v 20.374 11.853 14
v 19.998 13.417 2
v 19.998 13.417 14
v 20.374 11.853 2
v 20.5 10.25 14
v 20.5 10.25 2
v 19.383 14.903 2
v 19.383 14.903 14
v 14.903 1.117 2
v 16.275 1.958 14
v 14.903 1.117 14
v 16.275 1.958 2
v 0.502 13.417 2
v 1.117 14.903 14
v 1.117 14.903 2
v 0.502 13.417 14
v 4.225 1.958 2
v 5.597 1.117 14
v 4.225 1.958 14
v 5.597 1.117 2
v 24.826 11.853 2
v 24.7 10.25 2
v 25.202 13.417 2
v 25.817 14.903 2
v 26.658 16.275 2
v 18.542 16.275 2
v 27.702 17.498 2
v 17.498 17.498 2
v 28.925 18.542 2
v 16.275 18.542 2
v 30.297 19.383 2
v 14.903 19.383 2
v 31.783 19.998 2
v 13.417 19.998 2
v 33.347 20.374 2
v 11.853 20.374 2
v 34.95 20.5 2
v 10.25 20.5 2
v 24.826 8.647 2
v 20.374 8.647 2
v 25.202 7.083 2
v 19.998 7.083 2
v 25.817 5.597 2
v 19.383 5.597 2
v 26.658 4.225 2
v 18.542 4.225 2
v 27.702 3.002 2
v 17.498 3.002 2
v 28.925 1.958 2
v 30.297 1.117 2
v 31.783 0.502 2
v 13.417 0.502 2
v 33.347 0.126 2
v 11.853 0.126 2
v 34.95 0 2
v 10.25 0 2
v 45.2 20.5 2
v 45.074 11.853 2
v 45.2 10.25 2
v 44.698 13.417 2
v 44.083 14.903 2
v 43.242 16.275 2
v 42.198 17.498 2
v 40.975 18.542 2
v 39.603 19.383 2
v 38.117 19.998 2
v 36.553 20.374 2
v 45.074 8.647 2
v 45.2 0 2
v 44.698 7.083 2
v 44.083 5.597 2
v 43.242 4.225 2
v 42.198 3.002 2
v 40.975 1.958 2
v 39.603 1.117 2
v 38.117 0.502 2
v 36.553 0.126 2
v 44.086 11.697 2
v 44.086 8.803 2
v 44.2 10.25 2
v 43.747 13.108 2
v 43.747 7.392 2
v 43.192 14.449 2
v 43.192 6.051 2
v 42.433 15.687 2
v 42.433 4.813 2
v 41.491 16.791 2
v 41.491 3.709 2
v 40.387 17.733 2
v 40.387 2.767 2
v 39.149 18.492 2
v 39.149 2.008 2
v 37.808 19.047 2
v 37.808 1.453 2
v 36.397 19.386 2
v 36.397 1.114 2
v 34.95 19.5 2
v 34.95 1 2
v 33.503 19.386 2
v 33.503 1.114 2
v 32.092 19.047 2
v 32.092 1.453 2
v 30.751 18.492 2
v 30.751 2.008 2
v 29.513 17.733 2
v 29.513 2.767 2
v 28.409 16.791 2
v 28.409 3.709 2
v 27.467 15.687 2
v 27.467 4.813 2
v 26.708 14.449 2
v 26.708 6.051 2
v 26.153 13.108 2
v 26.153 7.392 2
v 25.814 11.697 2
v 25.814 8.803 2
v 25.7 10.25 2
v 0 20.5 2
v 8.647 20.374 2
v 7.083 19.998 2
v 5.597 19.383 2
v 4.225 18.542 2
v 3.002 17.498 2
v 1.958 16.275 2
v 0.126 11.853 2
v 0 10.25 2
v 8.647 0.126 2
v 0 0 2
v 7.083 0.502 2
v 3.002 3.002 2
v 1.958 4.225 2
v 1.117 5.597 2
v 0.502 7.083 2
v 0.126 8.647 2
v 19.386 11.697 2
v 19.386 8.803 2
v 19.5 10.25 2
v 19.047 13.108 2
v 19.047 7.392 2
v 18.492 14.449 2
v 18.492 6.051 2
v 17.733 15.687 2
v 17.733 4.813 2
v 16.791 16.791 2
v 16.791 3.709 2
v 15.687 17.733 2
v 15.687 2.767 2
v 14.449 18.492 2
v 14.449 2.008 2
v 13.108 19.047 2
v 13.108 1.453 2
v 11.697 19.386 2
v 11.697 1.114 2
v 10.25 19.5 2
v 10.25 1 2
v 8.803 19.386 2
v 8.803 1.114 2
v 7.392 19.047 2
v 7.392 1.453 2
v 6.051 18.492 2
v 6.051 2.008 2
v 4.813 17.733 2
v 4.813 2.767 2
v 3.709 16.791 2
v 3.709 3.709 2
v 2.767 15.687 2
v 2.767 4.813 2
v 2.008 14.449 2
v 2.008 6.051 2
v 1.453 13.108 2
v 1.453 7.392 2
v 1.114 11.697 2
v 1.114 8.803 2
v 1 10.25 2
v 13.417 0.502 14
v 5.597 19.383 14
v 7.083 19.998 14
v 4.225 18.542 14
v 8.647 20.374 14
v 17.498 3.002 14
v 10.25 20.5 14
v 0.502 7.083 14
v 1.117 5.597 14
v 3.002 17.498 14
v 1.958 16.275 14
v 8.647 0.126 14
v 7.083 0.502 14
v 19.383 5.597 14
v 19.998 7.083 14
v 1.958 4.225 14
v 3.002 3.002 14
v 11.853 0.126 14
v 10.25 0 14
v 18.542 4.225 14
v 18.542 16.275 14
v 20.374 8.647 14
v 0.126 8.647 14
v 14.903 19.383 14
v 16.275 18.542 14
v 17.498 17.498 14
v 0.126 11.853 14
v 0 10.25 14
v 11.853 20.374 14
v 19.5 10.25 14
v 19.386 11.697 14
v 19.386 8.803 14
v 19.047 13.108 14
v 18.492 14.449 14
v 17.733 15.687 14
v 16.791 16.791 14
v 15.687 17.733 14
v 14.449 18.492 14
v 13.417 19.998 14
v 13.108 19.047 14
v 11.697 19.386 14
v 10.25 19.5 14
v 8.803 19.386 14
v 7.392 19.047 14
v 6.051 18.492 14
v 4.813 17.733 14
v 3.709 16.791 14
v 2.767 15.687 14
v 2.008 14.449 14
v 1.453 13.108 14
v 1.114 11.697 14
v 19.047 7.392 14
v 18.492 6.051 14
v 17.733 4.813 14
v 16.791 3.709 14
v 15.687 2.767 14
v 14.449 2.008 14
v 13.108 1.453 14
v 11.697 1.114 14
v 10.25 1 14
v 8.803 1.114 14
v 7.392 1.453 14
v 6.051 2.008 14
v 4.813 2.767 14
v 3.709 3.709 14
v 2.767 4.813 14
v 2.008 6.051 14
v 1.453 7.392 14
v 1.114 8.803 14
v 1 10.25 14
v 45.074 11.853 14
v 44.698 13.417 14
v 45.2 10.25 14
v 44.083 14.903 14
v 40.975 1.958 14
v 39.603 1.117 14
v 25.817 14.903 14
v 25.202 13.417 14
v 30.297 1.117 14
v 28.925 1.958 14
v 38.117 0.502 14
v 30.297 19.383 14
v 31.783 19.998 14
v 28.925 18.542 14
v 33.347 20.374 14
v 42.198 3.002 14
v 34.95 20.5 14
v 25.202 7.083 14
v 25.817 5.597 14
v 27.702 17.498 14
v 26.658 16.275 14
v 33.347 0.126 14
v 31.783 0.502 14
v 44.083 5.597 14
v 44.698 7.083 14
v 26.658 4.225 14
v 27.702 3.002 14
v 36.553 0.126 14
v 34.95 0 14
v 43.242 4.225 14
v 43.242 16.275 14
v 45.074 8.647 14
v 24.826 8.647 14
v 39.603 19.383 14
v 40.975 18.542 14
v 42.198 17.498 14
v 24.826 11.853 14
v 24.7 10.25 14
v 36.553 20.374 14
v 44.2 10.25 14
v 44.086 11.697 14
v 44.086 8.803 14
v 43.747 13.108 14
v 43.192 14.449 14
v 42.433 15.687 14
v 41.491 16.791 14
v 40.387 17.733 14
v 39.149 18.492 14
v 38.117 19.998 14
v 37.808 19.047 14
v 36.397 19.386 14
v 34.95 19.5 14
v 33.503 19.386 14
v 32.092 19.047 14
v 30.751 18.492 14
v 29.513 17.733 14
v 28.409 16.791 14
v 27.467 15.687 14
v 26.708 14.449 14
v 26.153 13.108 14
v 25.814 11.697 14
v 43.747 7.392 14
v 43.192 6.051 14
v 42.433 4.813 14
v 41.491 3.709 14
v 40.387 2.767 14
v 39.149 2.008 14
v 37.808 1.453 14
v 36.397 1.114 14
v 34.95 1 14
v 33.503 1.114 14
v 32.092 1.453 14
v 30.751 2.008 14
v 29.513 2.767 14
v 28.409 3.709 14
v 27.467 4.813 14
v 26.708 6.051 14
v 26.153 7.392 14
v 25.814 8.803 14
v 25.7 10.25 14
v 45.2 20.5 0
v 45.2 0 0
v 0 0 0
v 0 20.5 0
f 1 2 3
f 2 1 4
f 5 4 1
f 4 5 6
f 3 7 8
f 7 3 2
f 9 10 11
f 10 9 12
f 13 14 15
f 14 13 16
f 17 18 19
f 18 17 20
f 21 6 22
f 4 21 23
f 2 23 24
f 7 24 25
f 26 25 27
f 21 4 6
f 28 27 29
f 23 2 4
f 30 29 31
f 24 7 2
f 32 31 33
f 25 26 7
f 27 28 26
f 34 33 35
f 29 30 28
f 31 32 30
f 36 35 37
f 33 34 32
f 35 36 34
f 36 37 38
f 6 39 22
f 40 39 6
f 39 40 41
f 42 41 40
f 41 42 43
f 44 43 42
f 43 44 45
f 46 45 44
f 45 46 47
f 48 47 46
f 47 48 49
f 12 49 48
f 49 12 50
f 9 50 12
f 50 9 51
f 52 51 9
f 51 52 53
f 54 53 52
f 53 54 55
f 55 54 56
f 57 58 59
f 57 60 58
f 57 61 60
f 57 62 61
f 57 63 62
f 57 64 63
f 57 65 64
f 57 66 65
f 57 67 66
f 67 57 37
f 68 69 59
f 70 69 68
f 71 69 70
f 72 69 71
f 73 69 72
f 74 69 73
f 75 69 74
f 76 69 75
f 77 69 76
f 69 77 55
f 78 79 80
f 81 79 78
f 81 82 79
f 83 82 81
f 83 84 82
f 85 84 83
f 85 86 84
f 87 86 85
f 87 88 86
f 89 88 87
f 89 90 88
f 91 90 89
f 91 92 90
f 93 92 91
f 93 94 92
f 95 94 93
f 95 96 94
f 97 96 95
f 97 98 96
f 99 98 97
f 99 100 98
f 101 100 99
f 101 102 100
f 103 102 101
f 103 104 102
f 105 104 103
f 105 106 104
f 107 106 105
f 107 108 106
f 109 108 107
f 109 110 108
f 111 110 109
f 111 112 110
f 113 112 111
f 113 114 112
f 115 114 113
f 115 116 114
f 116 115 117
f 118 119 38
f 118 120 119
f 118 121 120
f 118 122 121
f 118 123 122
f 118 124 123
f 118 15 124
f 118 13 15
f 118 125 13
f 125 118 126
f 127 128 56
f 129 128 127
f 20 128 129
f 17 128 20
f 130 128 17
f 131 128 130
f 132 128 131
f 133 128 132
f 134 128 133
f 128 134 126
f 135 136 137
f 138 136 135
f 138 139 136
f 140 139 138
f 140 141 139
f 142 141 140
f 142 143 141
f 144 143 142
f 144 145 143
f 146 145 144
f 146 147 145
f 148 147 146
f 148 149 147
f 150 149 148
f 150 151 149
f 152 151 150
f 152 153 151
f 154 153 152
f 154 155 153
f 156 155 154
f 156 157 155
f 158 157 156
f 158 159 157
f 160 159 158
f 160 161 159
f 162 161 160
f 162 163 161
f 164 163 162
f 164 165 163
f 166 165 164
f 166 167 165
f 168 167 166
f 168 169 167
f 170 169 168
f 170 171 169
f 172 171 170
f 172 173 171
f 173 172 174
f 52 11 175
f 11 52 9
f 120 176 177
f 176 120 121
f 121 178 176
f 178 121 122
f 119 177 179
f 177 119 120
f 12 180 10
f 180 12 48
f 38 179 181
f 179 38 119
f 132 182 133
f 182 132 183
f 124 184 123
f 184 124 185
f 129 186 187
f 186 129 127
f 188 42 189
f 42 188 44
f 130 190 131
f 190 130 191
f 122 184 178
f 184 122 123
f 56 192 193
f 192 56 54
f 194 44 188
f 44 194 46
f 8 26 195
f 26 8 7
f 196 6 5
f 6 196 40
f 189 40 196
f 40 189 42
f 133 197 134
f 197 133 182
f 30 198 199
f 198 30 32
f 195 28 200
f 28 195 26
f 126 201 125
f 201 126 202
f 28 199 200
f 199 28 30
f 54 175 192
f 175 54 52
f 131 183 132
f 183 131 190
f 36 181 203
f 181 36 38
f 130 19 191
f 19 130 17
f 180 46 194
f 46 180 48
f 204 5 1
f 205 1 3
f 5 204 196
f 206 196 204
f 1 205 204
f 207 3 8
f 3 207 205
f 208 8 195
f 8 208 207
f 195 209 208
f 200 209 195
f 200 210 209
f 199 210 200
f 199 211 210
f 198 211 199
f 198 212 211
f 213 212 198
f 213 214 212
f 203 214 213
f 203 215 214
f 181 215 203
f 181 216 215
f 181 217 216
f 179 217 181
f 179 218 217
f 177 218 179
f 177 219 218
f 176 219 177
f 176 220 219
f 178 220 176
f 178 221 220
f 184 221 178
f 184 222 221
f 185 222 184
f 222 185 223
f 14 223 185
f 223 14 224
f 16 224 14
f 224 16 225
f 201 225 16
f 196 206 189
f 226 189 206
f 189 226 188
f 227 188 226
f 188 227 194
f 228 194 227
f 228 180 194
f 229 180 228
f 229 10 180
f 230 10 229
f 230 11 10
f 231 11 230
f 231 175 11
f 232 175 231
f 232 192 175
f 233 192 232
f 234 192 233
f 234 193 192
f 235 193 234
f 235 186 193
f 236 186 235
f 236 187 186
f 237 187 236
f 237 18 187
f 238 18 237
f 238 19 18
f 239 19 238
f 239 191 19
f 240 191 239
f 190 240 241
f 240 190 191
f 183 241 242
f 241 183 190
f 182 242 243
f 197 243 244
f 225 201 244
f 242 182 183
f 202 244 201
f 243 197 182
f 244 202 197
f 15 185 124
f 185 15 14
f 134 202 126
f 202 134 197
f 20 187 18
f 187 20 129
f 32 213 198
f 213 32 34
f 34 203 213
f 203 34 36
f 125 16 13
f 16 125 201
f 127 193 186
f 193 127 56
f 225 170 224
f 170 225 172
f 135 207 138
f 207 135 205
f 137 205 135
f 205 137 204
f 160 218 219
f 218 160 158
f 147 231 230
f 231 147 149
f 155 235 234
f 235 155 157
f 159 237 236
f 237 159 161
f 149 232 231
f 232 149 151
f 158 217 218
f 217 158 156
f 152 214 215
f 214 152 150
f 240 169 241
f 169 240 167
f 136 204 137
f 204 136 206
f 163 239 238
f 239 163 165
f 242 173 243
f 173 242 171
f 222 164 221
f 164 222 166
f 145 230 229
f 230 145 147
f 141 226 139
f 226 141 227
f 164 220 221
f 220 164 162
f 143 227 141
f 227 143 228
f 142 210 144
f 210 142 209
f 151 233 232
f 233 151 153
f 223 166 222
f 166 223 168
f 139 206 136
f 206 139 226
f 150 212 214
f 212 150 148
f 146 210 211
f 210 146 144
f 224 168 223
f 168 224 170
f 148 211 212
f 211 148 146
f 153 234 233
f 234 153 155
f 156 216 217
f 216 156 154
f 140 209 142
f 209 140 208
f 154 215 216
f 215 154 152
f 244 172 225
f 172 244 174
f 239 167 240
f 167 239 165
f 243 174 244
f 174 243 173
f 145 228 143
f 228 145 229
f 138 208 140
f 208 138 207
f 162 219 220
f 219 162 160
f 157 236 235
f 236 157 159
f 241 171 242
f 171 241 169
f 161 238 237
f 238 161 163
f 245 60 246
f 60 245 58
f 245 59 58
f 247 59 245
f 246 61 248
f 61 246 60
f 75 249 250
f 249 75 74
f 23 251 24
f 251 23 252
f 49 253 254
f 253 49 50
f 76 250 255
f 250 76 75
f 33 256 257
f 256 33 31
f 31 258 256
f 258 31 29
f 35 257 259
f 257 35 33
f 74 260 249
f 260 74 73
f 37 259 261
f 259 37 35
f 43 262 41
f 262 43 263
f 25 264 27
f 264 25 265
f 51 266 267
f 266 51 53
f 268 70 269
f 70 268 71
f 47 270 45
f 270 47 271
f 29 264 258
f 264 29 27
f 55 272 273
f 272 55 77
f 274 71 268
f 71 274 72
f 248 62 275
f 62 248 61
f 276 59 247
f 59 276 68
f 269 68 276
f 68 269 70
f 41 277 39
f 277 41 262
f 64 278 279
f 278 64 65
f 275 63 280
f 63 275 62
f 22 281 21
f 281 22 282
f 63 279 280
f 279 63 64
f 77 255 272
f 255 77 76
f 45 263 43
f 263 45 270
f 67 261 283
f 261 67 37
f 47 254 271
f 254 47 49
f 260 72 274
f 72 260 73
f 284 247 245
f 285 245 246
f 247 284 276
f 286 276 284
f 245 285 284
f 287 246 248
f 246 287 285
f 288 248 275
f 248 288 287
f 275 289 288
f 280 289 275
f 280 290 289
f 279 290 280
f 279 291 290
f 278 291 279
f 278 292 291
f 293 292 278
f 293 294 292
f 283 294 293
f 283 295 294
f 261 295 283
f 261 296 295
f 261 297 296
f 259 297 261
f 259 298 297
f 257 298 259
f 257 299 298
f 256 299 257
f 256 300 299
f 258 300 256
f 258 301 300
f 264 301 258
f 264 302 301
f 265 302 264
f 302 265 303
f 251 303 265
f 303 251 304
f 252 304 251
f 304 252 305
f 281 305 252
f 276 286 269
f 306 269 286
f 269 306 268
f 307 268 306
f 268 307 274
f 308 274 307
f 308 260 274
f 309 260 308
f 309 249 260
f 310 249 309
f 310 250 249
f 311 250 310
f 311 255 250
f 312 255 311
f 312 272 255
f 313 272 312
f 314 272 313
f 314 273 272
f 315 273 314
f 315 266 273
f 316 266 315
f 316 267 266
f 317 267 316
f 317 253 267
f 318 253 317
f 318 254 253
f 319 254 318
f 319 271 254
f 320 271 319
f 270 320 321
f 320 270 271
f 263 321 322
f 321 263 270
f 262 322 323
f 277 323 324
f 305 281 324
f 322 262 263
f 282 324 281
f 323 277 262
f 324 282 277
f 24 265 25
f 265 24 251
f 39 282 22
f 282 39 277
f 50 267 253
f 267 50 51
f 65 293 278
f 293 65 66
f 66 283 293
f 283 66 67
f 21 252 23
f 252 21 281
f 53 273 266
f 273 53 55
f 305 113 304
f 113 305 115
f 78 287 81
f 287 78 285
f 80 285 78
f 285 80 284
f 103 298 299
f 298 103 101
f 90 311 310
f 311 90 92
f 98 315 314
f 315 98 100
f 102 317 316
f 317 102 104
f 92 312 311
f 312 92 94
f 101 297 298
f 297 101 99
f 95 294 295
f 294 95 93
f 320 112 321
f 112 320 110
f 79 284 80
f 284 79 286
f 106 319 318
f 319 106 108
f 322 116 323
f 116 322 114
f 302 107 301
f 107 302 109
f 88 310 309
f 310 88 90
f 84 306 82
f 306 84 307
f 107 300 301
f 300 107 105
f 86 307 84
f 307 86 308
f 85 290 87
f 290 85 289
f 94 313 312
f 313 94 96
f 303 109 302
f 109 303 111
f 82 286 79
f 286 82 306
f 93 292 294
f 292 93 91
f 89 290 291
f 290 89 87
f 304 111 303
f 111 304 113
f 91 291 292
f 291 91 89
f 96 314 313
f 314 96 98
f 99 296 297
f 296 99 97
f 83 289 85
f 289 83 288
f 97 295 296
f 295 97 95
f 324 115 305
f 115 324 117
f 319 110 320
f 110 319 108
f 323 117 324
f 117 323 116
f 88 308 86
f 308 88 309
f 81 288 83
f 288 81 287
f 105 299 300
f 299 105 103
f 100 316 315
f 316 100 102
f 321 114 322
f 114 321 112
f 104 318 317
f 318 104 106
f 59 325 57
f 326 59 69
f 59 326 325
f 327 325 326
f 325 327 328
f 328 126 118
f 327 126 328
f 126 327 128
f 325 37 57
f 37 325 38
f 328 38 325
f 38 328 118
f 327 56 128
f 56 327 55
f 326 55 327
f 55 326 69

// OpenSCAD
// file: tolerance.scad
// Author: Mihai Oltean, https://mihaioltean.github.io, mihai.oltean@gmail.com
// More details: https://jenny5.org, https://jenny5-robot.github.io/
// Source code: github.com/jenny5-robot
// MIT License
//--------------------------------------------------------------

tolerance = 0.1;
display_tolerance = 1;

overlap_tolerance = 0.01;

tolerance_z = [0, 0, tolerance];
tolerance_x = [tolerance, 0, 0];
tolerance_y = [0, tolerance, 0];

display_tolerance_z = [0, 0, display_tolerance];
display_tolerance_x = [display_tolerance, 0, 0];
display_tolerance_y = [0, display_tolerance, 0];

display_tolerance_xz = [display_tolerance, 0, display_tolerance];
display_tolerance_xy = [display_tolerance, display_tolerance, 0];
display_tolerance_yz = [0, display_tolerance, display_tolerance];

display_tolerance_xyz = [display_tolerance, display_tolerance, display_tolerance];
// file: config.scad
// Author: Mihai Oltean, https://mihaioltean.github.io, mihai.oltean@gmail.com
// More details: https://jenny5.org, https://jenny5-robot.github.io/
// Source code: github.com/jenny5-robot
// MIT License
//--------------------------------------------------------------

aluminium_color = "Silver";
screw_color = "LightSlateGray";
frame_color = aluminium_color;
shaft_color = "Silver";
plastic_color = "Yellow";
pulley_color = "DarkSlateGray";
steel_color = "LightSlateGray";
// file: utils.scad
// Author: Mihai Oltean, https://mihaioltean.github.io, mihai.oltean@gmail.com
// More details: https://jenny5.org, https://jenny5-robot.github.io/
// Source code: github.com/jenny5-robot
// MIT License
//--------------------------------------------------------------

module colt(radius, height)
{
	difference(){
		cube ([radius, radius, height]);
		cylinder	(h = height, r = radius, $fn = 30);
	}
}
/////////////////////////////////////////////////////////////////////////////////////////////////////////////////////////
module colt_sferic(radius)
{
	difference(){
		cube ([radius, radius, radius]);
		sphere(r = radius, $fn = 40);
	}
}
/////////////////////////////////////////////////////////////////////////////////////////////////////////////////////////
module coloana_sferica(height, radius)
{
		difference(){
			cube ([height, height, height]);
			cylinder(h= height, r = radius, $fn = 50);
		}
}
/////////////////////////////////////////////////////////////////////////////////////////////////////////////////////////
// file: params_basic_components.scad
// Author: Mihai Oltean, https://mihaioltean.github.io, mihai.oltean@gmail.com
// More details: https://jenny5.org, https://jenny5-robot.github.io/
// Source code: github.com/jenny5-robot
// MIT License
//--------------------------------------------------------------

spring_length = 20;

smooth_rod_8_radius = 4;
smooth_rod_10_radius = 5;
smooth_rod_12_radius = 6;

wall_thick_1 = 1;
wall_thick_2 = 2;
wall_thick_3 = 3;
wall_thick_4 = 4;
wall_thick_5 = 5;
wall_thick_5_5 = 5.5;
wall_thick_6 = 6;
wall_thick_7 = 7;
wall_thick_8 = 8;
wall_thick_9 = 9;
wall_thick_10 = 10;
wall_thick_12 = 12;
// file: params_screws_nuts_washers.scad
// Author: Mihai Oltean, https://mihaioltean.github.io, mihai.oltean@gmail.com
// More details: https://jenny5.org, https://jenny5-robot.github.io/
// Source code: github.com/jenny5-robot
// MIT License
//--------------------------------------------------------------


m2_screw_radius = 1;
m2_nut_radius = 2.2;
m2_nut_height = 1.6;
m2_nut_thick = m2_nut_height;

m3_screw_radius = 1.5;
m3_nut_radius = 3.1;
m3_nut_height = 2.3;
m3_nut_thick = m3_nut_height;
m3_autolock_nut_thick = 4.2;

m4_screw_radius = 2;
m4_nut_radius = 4;
m4_auto_lock_nut_height = 5;
m4_nut_height = 3.25;
m4_nut_thick = 3.25;

m5_screw_radius = 2.5;
m5_nut_radius = 4.6;
m5_nut_height = 4;

m6_screw_radius = 3;
m6_nut_radius = 5.65;
m6_nut_thick = 5;
m6_nut_slim_thick = 3;
m6_autolock_nut_thick = 6;
m6_long_nut_thick = 9;

m8_screw_head_height = 5.7;
m8_screw_radius = 3.9;
m8_nut_small_width = 12.8;
m8_nut_radius = 7.3;
m8_slim_nut_small_width = 12.4;
m8_nut_thick = 6.5;
m8_nut_height = m8_nut_thick;
m8_slim_nut_height = 5.5;
m8_screw_head_radius = 6.5;
m8_autolock_nut_thick = 8;

m10_screw_radius = 5;
m10_nut_thick = 8;
m10_nut_radius = 9.8;

M12_screw_radius = 6;
M12_nut_thick = 10;
M12_nut_radius = 11;
M12_long_long_nut_thick = 36;
M12_long_nut_thick = 36;
M12_autolock_nut_thick = 14;

m10_long_nut_radius = 9.71;
m10_long_nut_height = 29.8;

m10_long_thick_nut_radius = 7.41;
m10_long_thick_nut_height = 30.4;

m12_plastic_nut_radius = 10.45;
m12_plastic_nut_height = 23.3;

tr12_3_nut_radius = 11;
tr12_3_nut_height = 18.1;

washer_5 = 0.97;

washer_4_12_radius = 6;
washer_4_12_external_radius = 6;
washer_4_12_thick = 1;
washer_4_thick = 1;
washer_4_12_internal_radius = 2.15;

washer_4_9_external_radius = 4.5;
washer_4_9_internal_radius = 2.15;
washer_4_9_thick = 1;

washer_6_thick = 1.7;
washer_8_thick = 1.5;

washer_10_height = 2;
washer_10_thick = 2;

washer_12_thick = 2;

washer_5_15_external_radius = 7.5;
washer_5_15_thick = 1;
washer_5_thick = 1;
washer_5_15_internal_radius = 2.65;
// file: params_ultrasonic.scad
// Author: Mihai Oltean, https://mihaioltean.github.io, mihai.oltean@gmail.com
// More details: https://jenny5.org, https://jenny5-robot.github.io/
// Source code: github.com/jenny5-robot
// MIT License
//--------------------------------------------------------------

hc_sr04_sizes = [45.2, 20.5, 2];
hc_sr04_arm_sizes = [44, 21, 9];

hc_sr04_dist_to_holes = 0.75;

hc_sr04_hole_position = [
[hc_sr04_dist_to_holes, hc_sr04_dist_to_holes, 0], 
[hc_sr04_dist_to_holes + 42.5, hc_sr04_dist_to_holes, 0],
[hc_sr04_dist_to_holes + 42.5, hc_sr04_dist_to_holes + 17.5, 0],
[hc_sr04_dist_to_holes, hc_sr04_dist_to_holes + 17.5, 0]
];
// main file
// Author: Mihai Oltean, https://mihaioltean.github.io, mihai.oltean@gmail.com
// More details: https://jenny5.org, https://jenny5-robot.github.io/
// Source code: github.com/jenny5-robot
// MIT License
//--------------------------------------------------------------

include <params_ultrasonic.scad>
include <params_screws_nuts_washers.scad>
use <basic_components.scad>



//--------------------------------------------------------------
module hc_sr04()
{
  color("blue") cube(hc_sr04_sizes);
  color("silver") translate ([hc_sr04_sizes[1] / 2, hc_sr04_sizes[1] / 2, hc_sr04_sizes[2]]) cylinder_empty (12, hc_sr04_sizes[1] / 2, hc_sr04_sizes[1] / 2 - 1,40);  
    color("silver") translate ([hc_sr04_sizes[0] - hc_sr04_sizes[1] / 2, hc_sr04_sizes[1] / 2, hc_sr04_sizes[2]]) cylinder_empty (12, hc_sr04_sizes[1] / 2, hc_sr04_sizes[1] / 2 - 1, 40);  
}
//--------------------------------------------------------------

hc_sr04();
